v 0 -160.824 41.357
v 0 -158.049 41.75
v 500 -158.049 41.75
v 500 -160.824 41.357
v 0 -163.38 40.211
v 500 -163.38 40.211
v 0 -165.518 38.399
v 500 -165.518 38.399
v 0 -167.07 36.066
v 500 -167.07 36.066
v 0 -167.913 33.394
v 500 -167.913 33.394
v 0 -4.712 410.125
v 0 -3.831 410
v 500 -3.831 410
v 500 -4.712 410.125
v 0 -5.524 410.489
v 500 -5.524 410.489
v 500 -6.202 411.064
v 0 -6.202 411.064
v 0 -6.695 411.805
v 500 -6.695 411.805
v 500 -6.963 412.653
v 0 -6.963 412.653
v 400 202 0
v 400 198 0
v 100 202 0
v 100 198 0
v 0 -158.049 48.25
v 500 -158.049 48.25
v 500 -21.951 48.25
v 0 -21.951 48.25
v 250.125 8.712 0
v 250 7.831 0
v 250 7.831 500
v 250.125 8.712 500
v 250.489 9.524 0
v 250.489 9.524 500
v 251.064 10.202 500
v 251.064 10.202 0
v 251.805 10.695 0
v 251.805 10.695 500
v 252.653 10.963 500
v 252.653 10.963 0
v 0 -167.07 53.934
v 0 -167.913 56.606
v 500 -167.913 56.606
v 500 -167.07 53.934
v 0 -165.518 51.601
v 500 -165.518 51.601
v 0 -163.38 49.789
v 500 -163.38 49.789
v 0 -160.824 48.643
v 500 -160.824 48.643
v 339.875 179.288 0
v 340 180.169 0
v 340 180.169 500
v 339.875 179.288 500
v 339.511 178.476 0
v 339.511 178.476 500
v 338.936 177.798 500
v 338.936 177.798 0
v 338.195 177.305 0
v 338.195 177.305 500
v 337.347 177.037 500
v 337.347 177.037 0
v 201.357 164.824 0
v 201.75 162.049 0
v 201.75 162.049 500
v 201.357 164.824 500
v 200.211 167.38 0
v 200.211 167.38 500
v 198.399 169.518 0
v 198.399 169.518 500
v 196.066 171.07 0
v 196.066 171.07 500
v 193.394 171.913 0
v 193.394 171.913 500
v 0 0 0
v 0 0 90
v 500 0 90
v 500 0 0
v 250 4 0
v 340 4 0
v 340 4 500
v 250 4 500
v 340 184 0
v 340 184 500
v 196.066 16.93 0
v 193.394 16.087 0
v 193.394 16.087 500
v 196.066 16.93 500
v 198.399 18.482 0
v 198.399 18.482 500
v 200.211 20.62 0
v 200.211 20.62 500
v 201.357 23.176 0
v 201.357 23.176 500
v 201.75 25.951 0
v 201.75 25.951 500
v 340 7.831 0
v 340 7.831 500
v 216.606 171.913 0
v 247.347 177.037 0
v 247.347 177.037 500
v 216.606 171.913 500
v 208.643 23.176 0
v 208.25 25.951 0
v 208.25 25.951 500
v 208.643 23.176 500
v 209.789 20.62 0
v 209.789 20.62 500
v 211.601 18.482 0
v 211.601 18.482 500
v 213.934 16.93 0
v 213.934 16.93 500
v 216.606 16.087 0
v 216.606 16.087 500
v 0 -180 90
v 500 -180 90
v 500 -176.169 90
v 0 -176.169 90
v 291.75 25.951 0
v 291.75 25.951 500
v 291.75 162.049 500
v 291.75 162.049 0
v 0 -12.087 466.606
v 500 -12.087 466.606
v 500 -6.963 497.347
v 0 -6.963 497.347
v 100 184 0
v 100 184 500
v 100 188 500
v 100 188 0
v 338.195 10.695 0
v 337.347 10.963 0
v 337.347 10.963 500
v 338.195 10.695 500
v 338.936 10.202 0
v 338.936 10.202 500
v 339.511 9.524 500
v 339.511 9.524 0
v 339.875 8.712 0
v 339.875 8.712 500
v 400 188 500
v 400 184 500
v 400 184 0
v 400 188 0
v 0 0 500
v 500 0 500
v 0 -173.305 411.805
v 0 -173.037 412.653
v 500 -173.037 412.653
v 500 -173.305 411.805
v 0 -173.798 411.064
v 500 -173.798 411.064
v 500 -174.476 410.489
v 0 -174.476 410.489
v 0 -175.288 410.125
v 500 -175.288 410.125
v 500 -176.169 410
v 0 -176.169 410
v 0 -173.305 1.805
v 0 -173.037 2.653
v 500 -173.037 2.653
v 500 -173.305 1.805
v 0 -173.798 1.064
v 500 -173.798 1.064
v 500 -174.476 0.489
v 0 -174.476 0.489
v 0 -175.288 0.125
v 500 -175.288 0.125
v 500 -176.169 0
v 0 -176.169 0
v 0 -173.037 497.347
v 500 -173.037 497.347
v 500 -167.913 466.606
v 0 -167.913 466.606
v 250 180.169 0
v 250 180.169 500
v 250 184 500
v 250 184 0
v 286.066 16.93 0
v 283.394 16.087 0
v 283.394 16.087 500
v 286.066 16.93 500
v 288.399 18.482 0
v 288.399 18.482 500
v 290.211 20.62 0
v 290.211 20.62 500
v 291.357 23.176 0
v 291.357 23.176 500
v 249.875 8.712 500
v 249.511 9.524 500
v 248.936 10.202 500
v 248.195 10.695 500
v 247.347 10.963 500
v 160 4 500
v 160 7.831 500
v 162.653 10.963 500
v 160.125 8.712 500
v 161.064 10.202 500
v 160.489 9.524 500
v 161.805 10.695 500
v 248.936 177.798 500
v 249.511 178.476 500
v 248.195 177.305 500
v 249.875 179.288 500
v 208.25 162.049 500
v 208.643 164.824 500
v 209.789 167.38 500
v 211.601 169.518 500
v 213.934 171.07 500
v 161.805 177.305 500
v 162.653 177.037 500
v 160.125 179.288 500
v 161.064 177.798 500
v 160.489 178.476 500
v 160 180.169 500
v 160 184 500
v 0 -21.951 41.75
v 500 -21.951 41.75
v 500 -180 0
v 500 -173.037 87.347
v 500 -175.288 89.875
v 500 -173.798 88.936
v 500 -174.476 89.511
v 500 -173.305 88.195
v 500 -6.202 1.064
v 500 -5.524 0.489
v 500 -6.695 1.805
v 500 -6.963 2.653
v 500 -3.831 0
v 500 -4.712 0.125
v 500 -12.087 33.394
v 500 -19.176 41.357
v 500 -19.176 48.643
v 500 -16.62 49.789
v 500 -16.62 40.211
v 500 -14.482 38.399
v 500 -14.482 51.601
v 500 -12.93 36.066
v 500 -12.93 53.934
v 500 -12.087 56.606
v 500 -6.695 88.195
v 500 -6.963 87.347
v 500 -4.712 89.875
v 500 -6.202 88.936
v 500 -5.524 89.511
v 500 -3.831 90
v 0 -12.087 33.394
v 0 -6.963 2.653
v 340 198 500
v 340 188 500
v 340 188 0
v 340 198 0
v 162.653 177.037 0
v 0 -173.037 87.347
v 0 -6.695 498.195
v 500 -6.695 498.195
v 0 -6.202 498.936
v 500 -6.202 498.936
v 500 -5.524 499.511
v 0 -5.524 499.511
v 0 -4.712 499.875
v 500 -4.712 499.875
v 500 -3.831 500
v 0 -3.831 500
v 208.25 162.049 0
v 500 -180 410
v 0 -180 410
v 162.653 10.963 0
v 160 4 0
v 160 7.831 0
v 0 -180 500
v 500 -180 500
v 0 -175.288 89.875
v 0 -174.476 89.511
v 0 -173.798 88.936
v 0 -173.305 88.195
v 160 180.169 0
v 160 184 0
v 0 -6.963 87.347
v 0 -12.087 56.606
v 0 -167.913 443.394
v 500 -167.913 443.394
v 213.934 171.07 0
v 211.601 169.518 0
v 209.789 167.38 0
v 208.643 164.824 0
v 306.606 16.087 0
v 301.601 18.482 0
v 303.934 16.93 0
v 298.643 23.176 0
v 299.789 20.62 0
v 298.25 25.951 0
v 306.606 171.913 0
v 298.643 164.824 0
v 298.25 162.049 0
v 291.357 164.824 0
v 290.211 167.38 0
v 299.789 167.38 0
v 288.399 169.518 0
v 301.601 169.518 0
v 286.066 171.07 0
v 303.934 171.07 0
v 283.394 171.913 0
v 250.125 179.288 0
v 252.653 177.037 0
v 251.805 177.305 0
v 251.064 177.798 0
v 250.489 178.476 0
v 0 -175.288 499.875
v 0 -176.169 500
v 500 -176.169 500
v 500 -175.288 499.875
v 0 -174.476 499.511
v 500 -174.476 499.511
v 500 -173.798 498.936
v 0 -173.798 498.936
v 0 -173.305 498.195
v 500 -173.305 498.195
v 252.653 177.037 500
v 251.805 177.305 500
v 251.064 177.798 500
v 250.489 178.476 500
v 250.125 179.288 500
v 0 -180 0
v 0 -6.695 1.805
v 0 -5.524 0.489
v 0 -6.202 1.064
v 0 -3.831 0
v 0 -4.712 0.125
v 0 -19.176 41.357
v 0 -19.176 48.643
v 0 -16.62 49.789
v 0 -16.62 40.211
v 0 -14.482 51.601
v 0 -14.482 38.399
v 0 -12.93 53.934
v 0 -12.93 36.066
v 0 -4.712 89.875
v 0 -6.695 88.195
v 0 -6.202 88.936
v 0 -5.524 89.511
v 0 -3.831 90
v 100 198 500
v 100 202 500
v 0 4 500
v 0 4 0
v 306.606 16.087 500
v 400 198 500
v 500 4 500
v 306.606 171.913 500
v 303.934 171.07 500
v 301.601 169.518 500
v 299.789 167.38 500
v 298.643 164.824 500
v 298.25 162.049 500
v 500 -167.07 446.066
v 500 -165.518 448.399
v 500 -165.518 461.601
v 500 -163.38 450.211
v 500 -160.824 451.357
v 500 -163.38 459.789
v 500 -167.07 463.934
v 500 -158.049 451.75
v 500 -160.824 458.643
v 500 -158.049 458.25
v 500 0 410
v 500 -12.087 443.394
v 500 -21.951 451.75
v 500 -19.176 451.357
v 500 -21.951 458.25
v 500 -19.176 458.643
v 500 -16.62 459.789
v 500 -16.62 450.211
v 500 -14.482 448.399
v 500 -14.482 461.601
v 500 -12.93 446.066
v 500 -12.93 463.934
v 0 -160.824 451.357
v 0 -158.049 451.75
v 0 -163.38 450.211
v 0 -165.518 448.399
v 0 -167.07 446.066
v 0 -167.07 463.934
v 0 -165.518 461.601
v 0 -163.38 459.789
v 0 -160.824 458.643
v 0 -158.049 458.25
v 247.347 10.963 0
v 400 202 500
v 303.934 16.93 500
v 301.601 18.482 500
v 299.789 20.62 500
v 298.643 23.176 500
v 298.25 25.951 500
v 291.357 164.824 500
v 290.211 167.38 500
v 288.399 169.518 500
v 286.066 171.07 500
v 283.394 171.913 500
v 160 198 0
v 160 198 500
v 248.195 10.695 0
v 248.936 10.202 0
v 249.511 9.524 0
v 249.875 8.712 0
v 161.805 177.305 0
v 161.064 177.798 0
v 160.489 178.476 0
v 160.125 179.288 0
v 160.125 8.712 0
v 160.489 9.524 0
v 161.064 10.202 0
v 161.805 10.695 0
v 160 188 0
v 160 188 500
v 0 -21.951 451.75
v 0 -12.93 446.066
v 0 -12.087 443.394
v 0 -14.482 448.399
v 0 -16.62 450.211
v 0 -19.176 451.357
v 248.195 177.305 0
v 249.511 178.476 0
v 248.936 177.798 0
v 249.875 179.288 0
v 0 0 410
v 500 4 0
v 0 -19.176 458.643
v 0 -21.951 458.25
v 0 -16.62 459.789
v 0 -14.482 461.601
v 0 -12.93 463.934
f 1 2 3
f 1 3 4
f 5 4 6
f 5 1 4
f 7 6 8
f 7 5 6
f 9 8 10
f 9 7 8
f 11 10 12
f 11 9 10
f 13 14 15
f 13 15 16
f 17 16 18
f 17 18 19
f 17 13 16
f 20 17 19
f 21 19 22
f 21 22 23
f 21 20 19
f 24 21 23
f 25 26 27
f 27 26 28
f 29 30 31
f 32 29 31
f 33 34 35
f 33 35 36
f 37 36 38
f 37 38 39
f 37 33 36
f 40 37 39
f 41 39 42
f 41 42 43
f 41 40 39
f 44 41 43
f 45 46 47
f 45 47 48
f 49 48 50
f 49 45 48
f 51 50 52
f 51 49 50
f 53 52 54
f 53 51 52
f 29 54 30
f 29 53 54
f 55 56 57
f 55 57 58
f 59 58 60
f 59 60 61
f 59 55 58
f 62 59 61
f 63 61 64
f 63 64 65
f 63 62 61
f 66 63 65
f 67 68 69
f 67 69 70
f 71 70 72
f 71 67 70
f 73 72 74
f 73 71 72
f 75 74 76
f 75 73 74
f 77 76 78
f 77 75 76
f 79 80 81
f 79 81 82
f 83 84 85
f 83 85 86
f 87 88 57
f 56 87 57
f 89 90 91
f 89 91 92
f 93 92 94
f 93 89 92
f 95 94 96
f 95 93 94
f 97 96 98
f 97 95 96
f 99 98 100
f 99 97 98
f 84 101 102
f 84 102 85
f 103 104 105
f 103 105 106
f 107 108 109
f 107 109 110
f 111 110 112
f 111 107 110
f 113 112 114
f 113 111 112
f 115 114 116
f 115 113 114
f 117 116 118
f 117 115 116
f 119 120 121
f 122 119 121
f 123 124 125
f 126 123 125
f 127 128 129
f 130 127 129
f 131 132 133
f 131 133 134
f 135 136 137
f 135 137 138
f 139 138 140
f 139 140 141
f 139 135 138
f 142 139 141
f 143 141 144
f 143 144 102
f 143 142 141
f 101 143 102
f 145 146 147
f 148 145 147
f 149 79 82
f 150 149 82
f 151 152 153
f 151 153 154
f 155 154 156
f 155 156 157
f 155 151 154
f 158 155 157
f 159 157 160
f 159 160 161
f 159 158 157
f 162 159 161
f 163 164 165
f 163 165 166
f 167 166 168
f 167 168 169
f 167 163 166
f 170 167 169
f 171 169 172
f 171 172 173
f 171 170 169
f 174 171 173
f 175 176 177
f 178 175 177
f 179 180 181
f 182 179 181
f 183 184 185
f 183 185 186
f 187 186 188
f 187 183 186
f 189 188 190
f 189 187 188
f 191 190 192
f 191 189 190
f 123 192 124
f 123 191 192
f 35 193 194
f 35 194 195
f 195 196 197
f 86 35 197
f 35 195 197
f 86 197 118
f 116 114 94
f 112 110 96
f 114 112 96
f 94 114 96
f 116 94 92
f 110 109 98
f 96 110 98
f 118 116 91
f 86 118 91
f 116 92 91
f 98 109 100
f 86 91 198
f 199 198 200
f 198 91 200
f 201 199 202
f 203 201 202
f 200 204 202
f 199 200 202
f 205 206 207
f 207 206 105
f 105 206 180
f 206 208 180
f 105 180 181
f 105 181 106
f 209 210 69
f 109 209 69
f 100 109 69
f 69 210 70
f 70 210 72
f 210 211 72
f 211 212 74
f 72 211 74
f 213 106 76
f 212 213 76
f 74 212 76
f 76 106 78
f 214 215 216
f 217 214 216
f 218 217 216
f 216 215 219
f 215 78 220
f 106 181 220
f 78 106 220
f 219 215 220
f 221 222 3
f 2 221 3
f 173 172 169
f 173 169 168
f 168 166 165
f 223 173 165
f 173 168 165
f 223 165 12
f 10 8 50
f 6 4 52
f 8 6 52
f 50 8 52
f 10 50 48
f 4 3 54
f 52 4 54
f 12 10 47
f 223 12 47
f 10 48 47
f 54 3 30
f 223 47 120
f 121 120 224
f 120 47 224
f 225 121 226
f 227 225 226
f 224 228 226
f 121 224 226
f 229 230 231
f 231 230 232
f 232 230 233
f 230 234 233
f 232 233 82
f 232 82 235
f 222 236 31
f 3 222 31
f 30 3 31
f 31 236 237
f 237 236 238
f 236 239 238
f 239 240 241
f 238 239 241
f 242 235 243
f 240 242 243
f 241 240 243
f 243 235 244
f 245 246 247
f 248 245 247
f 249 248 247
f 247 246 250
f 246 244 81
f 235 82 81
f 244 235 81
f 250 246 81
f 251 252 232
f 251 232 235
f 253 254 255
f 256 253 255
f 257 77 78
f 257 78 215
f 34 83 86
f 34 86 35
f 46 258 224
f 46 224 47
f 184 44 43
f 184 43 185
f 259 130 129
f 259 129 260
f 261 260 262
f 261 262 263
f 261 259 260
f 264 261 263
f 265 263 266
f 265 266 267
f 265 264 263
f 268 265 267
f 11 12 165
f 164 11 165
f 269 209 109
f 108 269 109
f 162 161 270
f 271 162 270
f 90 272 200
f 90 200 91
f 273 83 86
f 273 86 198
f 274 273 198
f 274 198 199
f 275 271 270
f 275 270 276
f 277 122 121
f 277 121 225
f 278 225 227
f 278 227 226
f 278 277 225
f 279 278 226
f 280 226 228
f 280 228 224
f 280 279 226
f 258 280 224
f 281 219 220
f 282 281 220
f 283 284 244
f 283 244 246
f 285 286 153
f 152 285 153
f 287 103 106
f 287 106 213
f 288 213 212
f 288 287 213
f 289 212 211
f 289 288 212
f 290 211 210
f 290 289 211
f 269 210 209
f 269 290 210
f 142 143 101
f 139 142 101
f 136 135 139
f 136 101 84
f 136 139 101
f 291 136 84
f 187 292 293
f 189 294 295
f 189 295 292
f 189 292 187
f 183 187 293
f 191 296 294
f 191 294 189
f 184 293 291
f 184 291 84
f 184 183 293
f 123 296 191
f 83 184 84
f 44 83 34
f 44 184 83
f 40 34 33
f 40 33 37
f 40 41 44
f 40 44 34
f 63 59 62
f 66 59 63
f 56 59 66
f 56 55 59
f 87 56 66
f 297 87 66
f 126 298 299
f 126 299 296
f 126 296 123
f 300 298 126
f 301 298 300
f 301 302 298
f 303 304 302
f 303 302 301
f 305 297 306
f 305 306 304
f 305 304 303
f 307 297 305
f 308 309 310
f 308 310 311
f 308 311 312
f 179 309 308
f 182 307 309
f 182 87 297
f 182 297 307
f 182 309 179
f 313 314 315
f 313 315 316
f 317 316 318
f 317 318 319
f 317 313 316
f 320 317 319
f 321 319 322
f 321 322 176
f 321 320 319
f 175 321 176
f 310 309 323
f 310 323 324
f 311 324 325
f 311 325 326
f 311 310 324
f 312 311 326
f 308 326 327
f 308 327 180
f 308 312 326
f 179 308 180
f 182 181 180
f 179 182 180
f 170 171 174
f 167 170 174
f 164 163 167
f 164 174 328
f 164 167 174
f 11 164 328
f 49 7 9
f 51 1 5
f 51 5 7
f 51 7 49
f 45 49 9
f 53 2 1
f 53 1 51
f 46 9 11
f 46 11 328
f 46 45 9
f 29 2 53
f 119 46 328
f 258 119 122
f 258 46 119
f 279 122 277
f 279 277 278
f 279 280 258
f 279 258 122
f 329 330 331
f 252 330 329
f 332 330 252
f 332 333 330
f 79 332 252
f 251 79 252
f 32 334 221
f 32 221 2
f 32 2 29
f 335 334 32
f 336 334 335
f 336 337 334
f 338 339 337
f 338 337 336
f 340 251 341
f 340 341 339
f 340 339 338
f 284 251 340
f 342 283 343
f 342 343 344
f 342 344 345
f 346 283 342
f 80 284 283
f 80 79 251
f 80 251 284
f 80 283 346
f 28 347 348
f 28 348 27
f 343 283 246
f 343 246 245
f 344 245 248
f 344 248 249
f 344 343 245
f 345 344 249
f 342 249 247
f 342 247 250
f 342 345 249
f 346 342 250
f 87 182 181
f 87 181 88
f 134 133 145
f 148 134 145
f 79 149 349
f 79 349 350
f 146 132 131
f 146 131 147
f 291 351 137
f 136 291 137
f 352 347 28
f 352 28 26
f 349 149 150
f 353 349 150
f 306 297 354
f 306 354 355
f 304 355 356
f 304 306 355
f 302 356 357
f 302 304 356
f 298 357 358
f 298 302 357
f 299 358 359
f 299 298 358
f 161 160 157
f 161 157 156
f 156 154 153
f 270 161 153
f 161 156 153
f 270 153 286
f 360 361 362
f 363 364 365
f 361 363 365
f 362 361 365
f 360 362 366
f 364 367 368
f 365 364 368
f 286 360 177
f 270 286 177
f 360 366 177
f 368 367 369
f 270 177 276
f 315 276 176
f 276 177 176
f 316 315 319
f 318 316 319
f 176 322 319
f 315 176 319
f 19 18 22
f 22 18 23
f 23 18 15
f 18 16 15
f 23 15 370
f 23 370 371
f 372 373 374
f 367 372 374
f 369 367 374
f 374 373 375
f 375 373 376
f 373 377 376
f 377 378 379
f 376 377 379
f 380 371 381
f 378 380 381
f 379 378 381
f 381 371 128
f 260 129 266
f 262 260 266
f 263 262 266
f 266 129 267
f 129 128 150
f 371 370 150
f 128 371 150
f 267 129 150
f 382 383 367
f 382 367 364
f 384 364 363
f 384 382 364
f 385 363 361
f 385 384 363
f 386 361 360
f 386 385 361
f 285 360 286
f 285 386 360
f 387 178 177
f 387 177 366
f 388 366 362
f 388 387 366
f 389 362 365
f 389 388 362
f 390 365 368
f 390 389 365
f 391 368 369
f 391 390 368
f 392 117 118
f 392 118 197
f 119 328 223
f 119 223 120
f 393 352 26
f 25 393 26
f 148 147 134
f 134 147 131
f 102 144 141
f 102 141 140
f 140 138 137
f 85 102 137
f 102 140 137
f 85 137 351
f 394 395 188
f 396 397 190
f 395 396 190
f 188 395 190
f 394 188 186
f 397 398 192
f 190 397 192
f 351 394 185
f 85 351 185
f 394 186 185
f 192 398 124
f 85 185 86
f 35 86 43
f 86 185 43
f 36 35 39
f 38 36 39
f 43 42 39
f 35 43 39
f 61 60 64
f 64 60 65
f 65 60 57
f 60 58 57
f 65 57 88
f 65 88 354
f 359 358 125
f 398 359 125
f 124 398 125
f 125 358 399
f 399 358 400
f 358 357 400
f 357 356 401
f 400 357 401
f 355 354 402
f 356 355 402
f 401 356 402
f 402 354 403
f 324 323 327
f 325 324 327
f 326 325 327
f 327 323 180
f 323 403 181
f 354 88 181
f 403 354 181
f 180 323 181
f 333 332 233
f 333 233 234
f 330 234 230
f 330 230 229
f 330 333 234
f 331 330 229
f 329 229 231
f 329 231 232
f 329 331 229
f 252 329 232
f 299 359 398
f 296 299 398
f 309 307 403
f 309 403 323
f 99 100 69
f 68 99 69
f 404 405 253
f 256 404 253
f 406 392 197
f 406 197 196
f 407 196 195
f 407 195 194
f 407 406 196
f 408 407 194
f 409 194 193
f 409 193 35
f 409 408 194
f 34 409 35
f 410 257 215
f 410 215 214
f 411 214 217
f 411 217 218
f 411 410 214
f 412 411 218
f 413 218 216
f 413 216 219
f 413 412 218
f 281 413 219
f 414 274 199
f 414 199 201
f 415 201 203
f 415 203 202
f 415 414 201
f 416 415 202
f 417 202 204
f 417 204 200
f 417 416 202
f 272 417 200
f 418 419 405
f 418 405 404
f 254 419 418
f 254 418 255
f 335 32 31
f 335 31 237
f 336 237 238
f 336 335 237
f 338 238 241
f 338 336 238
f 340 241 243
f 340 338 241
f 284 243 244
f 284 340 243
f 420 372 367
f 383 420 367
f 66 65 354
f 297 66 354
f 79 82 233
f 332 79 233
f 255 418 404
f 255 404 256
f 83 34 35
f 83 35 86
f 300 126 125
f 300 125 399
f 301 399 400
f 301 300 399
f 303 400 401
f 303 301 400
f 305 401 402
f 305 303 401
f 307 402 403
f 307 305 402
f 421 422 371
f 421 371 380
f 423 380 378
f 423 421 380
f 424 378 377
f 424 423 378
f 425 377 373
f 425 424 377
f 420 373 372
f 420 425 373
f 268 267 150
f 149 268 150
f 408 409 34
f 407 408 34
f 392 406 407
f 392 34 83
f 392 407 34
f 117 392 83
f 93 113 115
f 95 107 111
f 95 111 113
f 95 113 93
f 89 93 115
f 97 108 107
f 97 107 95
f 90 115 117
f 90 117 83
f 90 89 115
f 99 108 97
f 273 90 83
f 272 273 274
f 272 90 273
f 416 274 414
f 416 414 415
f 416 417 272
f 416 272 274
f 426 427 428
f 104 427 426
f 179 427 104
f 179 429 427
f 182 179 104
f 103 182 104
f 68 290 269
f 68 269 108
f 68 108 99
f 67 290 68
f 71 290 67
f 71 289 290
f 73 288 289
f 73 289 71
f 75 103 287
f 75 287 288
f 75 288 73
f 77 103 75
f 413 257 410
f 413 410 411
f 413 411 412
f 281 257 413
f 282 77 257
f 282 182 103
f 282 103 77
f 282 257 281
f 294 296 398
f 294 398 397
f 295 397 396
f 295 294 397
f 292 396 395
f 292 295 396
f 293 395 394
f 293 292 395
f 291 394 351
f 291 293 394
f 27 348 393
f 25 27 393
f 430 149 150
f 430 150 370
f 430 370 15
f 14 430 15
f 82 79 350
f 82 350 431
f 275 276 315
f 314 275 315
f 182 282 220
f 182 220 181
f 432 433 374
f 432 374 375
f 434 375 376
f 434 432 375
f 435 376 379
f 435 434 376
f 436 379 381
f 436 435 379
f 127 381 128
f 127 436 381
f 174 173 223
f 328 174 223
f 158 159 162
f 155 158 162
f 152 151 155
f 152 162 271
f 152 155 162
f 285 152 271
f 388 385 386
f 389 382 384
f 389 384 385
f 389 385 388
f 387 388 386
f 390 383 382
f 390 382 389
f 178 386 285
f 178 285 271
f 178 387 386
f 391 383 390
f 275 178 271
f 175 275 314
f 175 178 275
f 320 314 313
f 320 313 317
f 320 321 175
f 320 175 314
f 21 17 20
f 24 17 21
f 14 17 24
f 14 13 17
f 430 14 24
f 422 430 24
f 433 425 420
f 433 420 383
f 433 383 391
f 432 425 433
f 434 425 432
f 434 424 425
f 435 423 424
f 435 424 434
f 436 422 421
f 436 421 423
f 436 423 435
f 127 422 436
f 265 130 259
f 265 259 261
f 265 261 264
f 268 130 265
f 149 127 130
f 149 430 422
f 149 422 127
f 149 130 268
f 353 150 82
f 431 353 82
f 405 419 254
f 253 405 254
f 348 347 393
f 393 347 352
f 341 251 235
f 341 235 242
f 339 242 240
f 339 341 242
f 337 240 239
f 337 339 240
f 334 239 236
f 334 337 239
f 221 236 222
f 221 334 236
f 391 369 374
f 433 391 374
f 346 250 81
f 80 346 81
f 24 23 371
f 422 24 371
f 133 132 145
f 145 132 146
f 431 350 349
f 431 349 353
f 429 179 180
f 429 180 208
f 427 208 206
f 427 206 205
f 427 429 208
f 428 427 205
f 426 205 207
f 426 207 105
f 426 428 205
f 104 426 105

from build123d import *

# Parameters (mm, degrees)
SB_BEAM_SB_180_X_23_1_DEPTH = 500
SB_BEAM_SB_180_X_23_2_DEPTH = 500
SKETCH1_W                   = 500
SKETCH1_H                   = 500
BOSS_EXTRUDE1_DEPTH         = 4
SB_BEAM_SB_180_X_23_3_DEPTH = 500
SB_BEAM_SB_180_X_23_4_DEPTH = 500
BOSS_EXTRUDE2_START         = 180
SKETCH132_W                 = 60
SKETCH132_H                 = 500
SKETCH132_W_2               = 180
BOSS_EXTRUDE2_DEPTH         = 4
BOSS_EXTRUDE3_START         = 184
SKETCH132_3_W               = 180
SKETCH132_3_H               = 500
BOSS_EXTRUDE3_DEPTH         = 10
BOSS_EXTRUDE4_START         = 194
SKETCH132_4_W               = 180
SKETCH132_4_H               = 500
SKETCH132_4_W_2             = 60
BOSS_EXTRUDE4_DEPTH         = 4


with BuildPart() as part:
    # Sketch125 → Sb beam SB 180 X 23(1) (new body)
    with BuildSketch(Plane(origin=(0, -90, 45), x_dir=(0, 0, -1), z_dir=(1, 0, 0))):
        with BuildLine():
            Line((-45, -90), (-45, -86.169016721))
            ThreePointArc((-45, -86.169016721), (-44.247600583, -84.116790755), (-42.347003833, -83.037222188))
            Line((-42.347003833, -83.037222188), (-11.60589344, -77.913330028))
            ThreePointArc((-11.60589344, -77.913330028), (-5.619761943, -74.513114068), (-3.25, -68.049410239))
            Line((-3.25, -68.049410239), (-3.25, 68.049410239))
            ThreePointArc((-3.25, 68.049410239), (-5.619761943, 74.513114068), (-11.60589344, 77.913330028))
            Line((-11.60589344, 77.913330028), (-42.347003833, 83.037222188))
            ThreePointArc((-42.347003833, 83.037222188), (-44.247600583, 84.116790755), (-45, 86.169016721))
            Line((-45, 86.169016721), (-45, 90))
            Line((-45, 90), (45, 90))
            Line((45, 90), (45, 86.169016721))
            ThreePointArc((45, 86.169016721), (44.247600583, 84.116790755), (42.347003833, 83.037222188))
            Line((42.347003833, 83.037222188), (11.60589344, 77.913330028))
            ThreePointArc((11.60589344, 77.913330028), (5.619761943, 74.513114068), (3.25, 68.049410239))
            Line((3.25, 68.049410239), (3.25, -68.049410239))
            ThreePointArc((3.25, -68.049410239), (5.619761943, -74.513114068), (11.60589344, -77.913330028))
            Line((11.60589344, -77.913330028), (42.347003833, -83.037222188))
            ThreePointArc((42.347003833, -83.037222188), (44.247600583, -84.116790755), (45, -86.169016721))
            Line((45, -86.169016721), (45, -90))
            Line((45, -90), (-45, -90))
        make_face()
    extrude(amount=SB_BEAM_SB_180_X_23_1_DEPTH)


with BuildPart() as body_2:
    # Sketch127 → Sb beam SB 180 X 23(2) (new body)
    with BuildSketch(Plane(origin=(0, -90, 455), x_dir=(0, 0, -1), z_dir=(1, 0, 0))):
        with BuildLine():
            Line((-45, -90), (-45, -86.169016721))
            ThreePointArc((-45, -86.169016721), (-44.247600583, -84.116790755), (-42.347003833, -83.037222188))
            Line((-42.347003833, -83.037222188), (-11.60589344, -77.913330028))
            ThreePointArc((-11.60589344, -77.913330028), (-5.619761943, -74.513114068), (-3.25, -68.049410239))
            Line((-3.25, -68.049410239), (-3.25, 68.049410239))
            ThreePointArc((-3.25, 68.049410239), (-5.619761943, 74.513114068), (-11.60589344, 77.913330028))
            Line((-11.60589344, 77.913330028), (-42.347003833, 83.037222188))
            ThreePointArc((-42.347003833, 83.037222188), (-44.247600583, 84.116790755), (-45, 86.169016721))
            Line((-45, 86.169016721), (-45, 90))
            Line((-45, 90), (45, 90))
            Line((45, 90), (45, 86.169016721))
            ThreePointArc((45, 86.169016721), (44.247600583, 84.116790755), (42.347003833, 83.037222188))
            Line((42.347003833, 83.037222188), (11.60589344, 77.913330028))
            ThreePointArc((11.60589344, 77.913330028), (5.619761943, 74.513114068), (3.25, 68.049410239))
            Line((3.25, 68.049410239), (3.25, -68.049410239))
            ThreePointArc((3.25, -68.049410239), (5.619761943, -74.513114068), (11.60589344, -77.913330028))
            Line((11.60589344, -77.913330028), (42.347003833, -83.037222188))
            ThreePointArc((42.347003833, -83.037222188), (44.247600583, -84.116790755), (45, -86.169016721))
            Line((45, -86.169016721), (45, -90))
            Line((45, -90), (-45, -90))
        make_face()
    extrude(amount=SB_BEAM_SB_180_X_23_2_DEPTH)


with BuildPart() as body_3:
    # Sketch1 → Boss-Extrude1 (new body)
    with BuildSketch(Plane(origin=(0, 0, 0), x_dir=(1, 0, 0), z_dir=(0, 1, 0))):
        with Locations((250, -250)):
            Rectangle(SKETCH1_W, SKETCH1_H)
    extrude(amount=BOSS_EXTRUDE1_DEPTH)


with BuildPart() as body_4:
    # Sketch129 → Sb beam SB 180 X 23(3) (new body)
    with BuildSketch(Plane(origin=(295, 94, 0), x_dir=(1, 0, 0), z_dir=(0, 0, 1))):
        with BuildLine():
            Line((-45, -90), (-45, -86.169016721))
            ThreePointArc((-45, -86.169016721), (-44.247600583, -84.116790755), (-42.347003833, -83.037222188))
            Line((-42.347003833, -83.037222188), (-11.60589344, -77.913330028))
            ThreePointArc((-11.60589344, -77.913330028), (-5.619761943, -74.513114068), (-3.25, -68.049410239))
            Line((-3.25, -68.049410239), (-3.25, 68.049410239))
            ThreePointArc((-3.25, 68.049410239), (-5.619761943, 74.513114068), (-11.60589344, 77.913330028))
            Line((-11.60589344, 77.913330028), (-42.347003833, 83.037222188))
            ThreePointArc((-42.347003833, 83.037222188), (-44.247600583, 84.116790755), (-45, 86.169016721))
            Line((-45, 86.169016721), (-45, 90))
            Line((-45, 90), (45, 90))
            Line((45, 90), (45, 86.169016721))
            ThreePointArc((45, 86.169016721), (44.247600583, 84.116790755), (42.347003833, 83.037222188))
            Line((42.347003833, 83.037222188), (11.60589344, 77.913330028))
            ThreePointArc((11.60589344, 77.913330028), (5.619761943, 74.513114068), (3.25, 68.049410239))
            Line((3.25, 68.049410239), (3.25, -68.049410239))
            ThreePointArc((3.25, -68.049410239), (5.619761943, -74.513114068), (11.60589344, -77.913330028))
            Line((11.60589344, -77.913330028), (42.347003833, -83.037222188))
            ThreePointArc((42.347003833, -83.037222188), (44.247600583, -84.116790755), (45, -86.169016721))
            Line((45, -86.169016721), (45, -90))
            Line((45, -90), (-45, -90))
        make_face()
    extrude(amount=SB_BEAM_SB_180_X_23_3_DEPTH)


with BuildPart() as body_5:
    # Sketch131 → Sb beam SB 180 X 23(4) (new body)
    with BuildSketch(Plane(origin=(205, 94, 0), x_dir=(1, 0, 0), z_dir=(0, 0, 1))):
        with BuildLine():
            Line((-45, -90), (-45, -86.169016721))
            ThreePointArc((-45, -86.169016721), (-44.247600583, -84.116790755), (-42.347003833, -83.037222188))
            Line((-42.347003833, -83.037222188), (-11.60589344, -77.913330028))
            ThreePointArc((-11.60589344, -77.913330028), (-5.619761943, -74.513114068), (-3.25, -68.049410239))
            Line((-3.25, -68.049410239), (-3.25, 68.049410239))
            ThreePointArc((-3.25, 68.049410239), (-5.619761943, 74.513114068), (-11.60589344, 77.913330028))
            Line((-11.60589344, 77.913330028), (-42.347003833, 83.037222188))
            ThreePointArc((-42.347003833, 83.037222188), (-44.247600583, 84.116790755), (-45, 86.169016721))
            Line((-45, 86.169016721), (-45, 90))
            Line((-45, 90), (45, 90))
            Line((45, 90), (45, 86.169016721))
            ThreePointArc((45, 86.169016721), (44.247600583, 84.116790755), (42.347003833, 83.037222188))
            Line((42.347003833, 83.037222188), (11.60589344, 77.913330028))
            ThreePointArc((11.60589344, 77.913330028), (5.619761943, 74.513114068), (3.25, 68.049410239))
            Line((3.25, 68.049410239), (3.25, -68.049410239))
            ThreePointArc((3.25, -68.049410239), (5.619761943, -74.513114068), (11.60589344, -77.913330028))
            Line((11.60589344, -77.913330028), (42.347003833, -83.037222188))
            ThreePointArc((42.347003833, -83.037222188), (44.247600583, -84.116790755), (45, -86.169016721))
            Line((45, -86.169016721), (45, -90))
            Line((45, -90), (-45, -90))
        make_face()
    extrude(amount=SB_BEAM_SB_180_X_23_4_DEPTH)


with BuildPart() as body_6:
    # Sketch132 → Boss-Extrude2 (new body)
    with BuildSketch(Plane(origin=(0, 4, 0), x_dir=(1, 0, 0), z_dir=(0, 1, 0)).offset(BOSS_EXTRUDE2_START)):
        with Locations((130, -250)):
            Rectangle(SKETCH132_W, SKETCH132_H)
        with Locations((370, -250)):
            Rectangle(SKETCH132_W, SKETCH132_H)
        with Locations((250, -250)):
            Rectangle(SKETCH132_W_2, SKETCH132_H)
    extrude(amount=BOSS_EXTRUDE2_DEPTH)


with BuildPart() as body_7:
    # Sketch132<3> → Boss-Extrude3 (new body)
    with BuildSketch(Plane(origin=(0, 4, 0), x_dir=(1, 0, 0), z_dir=(0, 1, 0)).offset(BOSS_EXTRUDE3_START)):
        with Locations((250, -250)):
            Rectangle(SKETCH132_3_W, SKETCH132_3_H)
    extrude(amount=BOSS_EXTRUDE3_DEPTH)


with BuildPart() as body_8:
    # Sketch132<4> → Boss-Extrude4 (new body)
    with BuildSketch(Plane(origin=(0, 4, 0), x_dir=(1, 0, 0), z_dir=(0, 1, 0)).offset(BOSS_EXTRUDE4_START)):
        with Locations((250, -250)):
            Rectangle(SKETCH132_4_W, SKETCH132_4_H)
        with Locations((370, -250)):
            Rectangle(SKETCH132_4_W_2, SKETCH132_4_H)
        with Locations((130, -250)):
            Rectangle(SKETCH132_4_W_2, SKETCH132_4_H)
    extrude(amount=BOSS_EXTRUDE4_DEPTH)


solid = Compound([part.part, body_2.part, body_3.part, body_4.part, body_5.part, body_6.part, body_7.part, body_8.part])
